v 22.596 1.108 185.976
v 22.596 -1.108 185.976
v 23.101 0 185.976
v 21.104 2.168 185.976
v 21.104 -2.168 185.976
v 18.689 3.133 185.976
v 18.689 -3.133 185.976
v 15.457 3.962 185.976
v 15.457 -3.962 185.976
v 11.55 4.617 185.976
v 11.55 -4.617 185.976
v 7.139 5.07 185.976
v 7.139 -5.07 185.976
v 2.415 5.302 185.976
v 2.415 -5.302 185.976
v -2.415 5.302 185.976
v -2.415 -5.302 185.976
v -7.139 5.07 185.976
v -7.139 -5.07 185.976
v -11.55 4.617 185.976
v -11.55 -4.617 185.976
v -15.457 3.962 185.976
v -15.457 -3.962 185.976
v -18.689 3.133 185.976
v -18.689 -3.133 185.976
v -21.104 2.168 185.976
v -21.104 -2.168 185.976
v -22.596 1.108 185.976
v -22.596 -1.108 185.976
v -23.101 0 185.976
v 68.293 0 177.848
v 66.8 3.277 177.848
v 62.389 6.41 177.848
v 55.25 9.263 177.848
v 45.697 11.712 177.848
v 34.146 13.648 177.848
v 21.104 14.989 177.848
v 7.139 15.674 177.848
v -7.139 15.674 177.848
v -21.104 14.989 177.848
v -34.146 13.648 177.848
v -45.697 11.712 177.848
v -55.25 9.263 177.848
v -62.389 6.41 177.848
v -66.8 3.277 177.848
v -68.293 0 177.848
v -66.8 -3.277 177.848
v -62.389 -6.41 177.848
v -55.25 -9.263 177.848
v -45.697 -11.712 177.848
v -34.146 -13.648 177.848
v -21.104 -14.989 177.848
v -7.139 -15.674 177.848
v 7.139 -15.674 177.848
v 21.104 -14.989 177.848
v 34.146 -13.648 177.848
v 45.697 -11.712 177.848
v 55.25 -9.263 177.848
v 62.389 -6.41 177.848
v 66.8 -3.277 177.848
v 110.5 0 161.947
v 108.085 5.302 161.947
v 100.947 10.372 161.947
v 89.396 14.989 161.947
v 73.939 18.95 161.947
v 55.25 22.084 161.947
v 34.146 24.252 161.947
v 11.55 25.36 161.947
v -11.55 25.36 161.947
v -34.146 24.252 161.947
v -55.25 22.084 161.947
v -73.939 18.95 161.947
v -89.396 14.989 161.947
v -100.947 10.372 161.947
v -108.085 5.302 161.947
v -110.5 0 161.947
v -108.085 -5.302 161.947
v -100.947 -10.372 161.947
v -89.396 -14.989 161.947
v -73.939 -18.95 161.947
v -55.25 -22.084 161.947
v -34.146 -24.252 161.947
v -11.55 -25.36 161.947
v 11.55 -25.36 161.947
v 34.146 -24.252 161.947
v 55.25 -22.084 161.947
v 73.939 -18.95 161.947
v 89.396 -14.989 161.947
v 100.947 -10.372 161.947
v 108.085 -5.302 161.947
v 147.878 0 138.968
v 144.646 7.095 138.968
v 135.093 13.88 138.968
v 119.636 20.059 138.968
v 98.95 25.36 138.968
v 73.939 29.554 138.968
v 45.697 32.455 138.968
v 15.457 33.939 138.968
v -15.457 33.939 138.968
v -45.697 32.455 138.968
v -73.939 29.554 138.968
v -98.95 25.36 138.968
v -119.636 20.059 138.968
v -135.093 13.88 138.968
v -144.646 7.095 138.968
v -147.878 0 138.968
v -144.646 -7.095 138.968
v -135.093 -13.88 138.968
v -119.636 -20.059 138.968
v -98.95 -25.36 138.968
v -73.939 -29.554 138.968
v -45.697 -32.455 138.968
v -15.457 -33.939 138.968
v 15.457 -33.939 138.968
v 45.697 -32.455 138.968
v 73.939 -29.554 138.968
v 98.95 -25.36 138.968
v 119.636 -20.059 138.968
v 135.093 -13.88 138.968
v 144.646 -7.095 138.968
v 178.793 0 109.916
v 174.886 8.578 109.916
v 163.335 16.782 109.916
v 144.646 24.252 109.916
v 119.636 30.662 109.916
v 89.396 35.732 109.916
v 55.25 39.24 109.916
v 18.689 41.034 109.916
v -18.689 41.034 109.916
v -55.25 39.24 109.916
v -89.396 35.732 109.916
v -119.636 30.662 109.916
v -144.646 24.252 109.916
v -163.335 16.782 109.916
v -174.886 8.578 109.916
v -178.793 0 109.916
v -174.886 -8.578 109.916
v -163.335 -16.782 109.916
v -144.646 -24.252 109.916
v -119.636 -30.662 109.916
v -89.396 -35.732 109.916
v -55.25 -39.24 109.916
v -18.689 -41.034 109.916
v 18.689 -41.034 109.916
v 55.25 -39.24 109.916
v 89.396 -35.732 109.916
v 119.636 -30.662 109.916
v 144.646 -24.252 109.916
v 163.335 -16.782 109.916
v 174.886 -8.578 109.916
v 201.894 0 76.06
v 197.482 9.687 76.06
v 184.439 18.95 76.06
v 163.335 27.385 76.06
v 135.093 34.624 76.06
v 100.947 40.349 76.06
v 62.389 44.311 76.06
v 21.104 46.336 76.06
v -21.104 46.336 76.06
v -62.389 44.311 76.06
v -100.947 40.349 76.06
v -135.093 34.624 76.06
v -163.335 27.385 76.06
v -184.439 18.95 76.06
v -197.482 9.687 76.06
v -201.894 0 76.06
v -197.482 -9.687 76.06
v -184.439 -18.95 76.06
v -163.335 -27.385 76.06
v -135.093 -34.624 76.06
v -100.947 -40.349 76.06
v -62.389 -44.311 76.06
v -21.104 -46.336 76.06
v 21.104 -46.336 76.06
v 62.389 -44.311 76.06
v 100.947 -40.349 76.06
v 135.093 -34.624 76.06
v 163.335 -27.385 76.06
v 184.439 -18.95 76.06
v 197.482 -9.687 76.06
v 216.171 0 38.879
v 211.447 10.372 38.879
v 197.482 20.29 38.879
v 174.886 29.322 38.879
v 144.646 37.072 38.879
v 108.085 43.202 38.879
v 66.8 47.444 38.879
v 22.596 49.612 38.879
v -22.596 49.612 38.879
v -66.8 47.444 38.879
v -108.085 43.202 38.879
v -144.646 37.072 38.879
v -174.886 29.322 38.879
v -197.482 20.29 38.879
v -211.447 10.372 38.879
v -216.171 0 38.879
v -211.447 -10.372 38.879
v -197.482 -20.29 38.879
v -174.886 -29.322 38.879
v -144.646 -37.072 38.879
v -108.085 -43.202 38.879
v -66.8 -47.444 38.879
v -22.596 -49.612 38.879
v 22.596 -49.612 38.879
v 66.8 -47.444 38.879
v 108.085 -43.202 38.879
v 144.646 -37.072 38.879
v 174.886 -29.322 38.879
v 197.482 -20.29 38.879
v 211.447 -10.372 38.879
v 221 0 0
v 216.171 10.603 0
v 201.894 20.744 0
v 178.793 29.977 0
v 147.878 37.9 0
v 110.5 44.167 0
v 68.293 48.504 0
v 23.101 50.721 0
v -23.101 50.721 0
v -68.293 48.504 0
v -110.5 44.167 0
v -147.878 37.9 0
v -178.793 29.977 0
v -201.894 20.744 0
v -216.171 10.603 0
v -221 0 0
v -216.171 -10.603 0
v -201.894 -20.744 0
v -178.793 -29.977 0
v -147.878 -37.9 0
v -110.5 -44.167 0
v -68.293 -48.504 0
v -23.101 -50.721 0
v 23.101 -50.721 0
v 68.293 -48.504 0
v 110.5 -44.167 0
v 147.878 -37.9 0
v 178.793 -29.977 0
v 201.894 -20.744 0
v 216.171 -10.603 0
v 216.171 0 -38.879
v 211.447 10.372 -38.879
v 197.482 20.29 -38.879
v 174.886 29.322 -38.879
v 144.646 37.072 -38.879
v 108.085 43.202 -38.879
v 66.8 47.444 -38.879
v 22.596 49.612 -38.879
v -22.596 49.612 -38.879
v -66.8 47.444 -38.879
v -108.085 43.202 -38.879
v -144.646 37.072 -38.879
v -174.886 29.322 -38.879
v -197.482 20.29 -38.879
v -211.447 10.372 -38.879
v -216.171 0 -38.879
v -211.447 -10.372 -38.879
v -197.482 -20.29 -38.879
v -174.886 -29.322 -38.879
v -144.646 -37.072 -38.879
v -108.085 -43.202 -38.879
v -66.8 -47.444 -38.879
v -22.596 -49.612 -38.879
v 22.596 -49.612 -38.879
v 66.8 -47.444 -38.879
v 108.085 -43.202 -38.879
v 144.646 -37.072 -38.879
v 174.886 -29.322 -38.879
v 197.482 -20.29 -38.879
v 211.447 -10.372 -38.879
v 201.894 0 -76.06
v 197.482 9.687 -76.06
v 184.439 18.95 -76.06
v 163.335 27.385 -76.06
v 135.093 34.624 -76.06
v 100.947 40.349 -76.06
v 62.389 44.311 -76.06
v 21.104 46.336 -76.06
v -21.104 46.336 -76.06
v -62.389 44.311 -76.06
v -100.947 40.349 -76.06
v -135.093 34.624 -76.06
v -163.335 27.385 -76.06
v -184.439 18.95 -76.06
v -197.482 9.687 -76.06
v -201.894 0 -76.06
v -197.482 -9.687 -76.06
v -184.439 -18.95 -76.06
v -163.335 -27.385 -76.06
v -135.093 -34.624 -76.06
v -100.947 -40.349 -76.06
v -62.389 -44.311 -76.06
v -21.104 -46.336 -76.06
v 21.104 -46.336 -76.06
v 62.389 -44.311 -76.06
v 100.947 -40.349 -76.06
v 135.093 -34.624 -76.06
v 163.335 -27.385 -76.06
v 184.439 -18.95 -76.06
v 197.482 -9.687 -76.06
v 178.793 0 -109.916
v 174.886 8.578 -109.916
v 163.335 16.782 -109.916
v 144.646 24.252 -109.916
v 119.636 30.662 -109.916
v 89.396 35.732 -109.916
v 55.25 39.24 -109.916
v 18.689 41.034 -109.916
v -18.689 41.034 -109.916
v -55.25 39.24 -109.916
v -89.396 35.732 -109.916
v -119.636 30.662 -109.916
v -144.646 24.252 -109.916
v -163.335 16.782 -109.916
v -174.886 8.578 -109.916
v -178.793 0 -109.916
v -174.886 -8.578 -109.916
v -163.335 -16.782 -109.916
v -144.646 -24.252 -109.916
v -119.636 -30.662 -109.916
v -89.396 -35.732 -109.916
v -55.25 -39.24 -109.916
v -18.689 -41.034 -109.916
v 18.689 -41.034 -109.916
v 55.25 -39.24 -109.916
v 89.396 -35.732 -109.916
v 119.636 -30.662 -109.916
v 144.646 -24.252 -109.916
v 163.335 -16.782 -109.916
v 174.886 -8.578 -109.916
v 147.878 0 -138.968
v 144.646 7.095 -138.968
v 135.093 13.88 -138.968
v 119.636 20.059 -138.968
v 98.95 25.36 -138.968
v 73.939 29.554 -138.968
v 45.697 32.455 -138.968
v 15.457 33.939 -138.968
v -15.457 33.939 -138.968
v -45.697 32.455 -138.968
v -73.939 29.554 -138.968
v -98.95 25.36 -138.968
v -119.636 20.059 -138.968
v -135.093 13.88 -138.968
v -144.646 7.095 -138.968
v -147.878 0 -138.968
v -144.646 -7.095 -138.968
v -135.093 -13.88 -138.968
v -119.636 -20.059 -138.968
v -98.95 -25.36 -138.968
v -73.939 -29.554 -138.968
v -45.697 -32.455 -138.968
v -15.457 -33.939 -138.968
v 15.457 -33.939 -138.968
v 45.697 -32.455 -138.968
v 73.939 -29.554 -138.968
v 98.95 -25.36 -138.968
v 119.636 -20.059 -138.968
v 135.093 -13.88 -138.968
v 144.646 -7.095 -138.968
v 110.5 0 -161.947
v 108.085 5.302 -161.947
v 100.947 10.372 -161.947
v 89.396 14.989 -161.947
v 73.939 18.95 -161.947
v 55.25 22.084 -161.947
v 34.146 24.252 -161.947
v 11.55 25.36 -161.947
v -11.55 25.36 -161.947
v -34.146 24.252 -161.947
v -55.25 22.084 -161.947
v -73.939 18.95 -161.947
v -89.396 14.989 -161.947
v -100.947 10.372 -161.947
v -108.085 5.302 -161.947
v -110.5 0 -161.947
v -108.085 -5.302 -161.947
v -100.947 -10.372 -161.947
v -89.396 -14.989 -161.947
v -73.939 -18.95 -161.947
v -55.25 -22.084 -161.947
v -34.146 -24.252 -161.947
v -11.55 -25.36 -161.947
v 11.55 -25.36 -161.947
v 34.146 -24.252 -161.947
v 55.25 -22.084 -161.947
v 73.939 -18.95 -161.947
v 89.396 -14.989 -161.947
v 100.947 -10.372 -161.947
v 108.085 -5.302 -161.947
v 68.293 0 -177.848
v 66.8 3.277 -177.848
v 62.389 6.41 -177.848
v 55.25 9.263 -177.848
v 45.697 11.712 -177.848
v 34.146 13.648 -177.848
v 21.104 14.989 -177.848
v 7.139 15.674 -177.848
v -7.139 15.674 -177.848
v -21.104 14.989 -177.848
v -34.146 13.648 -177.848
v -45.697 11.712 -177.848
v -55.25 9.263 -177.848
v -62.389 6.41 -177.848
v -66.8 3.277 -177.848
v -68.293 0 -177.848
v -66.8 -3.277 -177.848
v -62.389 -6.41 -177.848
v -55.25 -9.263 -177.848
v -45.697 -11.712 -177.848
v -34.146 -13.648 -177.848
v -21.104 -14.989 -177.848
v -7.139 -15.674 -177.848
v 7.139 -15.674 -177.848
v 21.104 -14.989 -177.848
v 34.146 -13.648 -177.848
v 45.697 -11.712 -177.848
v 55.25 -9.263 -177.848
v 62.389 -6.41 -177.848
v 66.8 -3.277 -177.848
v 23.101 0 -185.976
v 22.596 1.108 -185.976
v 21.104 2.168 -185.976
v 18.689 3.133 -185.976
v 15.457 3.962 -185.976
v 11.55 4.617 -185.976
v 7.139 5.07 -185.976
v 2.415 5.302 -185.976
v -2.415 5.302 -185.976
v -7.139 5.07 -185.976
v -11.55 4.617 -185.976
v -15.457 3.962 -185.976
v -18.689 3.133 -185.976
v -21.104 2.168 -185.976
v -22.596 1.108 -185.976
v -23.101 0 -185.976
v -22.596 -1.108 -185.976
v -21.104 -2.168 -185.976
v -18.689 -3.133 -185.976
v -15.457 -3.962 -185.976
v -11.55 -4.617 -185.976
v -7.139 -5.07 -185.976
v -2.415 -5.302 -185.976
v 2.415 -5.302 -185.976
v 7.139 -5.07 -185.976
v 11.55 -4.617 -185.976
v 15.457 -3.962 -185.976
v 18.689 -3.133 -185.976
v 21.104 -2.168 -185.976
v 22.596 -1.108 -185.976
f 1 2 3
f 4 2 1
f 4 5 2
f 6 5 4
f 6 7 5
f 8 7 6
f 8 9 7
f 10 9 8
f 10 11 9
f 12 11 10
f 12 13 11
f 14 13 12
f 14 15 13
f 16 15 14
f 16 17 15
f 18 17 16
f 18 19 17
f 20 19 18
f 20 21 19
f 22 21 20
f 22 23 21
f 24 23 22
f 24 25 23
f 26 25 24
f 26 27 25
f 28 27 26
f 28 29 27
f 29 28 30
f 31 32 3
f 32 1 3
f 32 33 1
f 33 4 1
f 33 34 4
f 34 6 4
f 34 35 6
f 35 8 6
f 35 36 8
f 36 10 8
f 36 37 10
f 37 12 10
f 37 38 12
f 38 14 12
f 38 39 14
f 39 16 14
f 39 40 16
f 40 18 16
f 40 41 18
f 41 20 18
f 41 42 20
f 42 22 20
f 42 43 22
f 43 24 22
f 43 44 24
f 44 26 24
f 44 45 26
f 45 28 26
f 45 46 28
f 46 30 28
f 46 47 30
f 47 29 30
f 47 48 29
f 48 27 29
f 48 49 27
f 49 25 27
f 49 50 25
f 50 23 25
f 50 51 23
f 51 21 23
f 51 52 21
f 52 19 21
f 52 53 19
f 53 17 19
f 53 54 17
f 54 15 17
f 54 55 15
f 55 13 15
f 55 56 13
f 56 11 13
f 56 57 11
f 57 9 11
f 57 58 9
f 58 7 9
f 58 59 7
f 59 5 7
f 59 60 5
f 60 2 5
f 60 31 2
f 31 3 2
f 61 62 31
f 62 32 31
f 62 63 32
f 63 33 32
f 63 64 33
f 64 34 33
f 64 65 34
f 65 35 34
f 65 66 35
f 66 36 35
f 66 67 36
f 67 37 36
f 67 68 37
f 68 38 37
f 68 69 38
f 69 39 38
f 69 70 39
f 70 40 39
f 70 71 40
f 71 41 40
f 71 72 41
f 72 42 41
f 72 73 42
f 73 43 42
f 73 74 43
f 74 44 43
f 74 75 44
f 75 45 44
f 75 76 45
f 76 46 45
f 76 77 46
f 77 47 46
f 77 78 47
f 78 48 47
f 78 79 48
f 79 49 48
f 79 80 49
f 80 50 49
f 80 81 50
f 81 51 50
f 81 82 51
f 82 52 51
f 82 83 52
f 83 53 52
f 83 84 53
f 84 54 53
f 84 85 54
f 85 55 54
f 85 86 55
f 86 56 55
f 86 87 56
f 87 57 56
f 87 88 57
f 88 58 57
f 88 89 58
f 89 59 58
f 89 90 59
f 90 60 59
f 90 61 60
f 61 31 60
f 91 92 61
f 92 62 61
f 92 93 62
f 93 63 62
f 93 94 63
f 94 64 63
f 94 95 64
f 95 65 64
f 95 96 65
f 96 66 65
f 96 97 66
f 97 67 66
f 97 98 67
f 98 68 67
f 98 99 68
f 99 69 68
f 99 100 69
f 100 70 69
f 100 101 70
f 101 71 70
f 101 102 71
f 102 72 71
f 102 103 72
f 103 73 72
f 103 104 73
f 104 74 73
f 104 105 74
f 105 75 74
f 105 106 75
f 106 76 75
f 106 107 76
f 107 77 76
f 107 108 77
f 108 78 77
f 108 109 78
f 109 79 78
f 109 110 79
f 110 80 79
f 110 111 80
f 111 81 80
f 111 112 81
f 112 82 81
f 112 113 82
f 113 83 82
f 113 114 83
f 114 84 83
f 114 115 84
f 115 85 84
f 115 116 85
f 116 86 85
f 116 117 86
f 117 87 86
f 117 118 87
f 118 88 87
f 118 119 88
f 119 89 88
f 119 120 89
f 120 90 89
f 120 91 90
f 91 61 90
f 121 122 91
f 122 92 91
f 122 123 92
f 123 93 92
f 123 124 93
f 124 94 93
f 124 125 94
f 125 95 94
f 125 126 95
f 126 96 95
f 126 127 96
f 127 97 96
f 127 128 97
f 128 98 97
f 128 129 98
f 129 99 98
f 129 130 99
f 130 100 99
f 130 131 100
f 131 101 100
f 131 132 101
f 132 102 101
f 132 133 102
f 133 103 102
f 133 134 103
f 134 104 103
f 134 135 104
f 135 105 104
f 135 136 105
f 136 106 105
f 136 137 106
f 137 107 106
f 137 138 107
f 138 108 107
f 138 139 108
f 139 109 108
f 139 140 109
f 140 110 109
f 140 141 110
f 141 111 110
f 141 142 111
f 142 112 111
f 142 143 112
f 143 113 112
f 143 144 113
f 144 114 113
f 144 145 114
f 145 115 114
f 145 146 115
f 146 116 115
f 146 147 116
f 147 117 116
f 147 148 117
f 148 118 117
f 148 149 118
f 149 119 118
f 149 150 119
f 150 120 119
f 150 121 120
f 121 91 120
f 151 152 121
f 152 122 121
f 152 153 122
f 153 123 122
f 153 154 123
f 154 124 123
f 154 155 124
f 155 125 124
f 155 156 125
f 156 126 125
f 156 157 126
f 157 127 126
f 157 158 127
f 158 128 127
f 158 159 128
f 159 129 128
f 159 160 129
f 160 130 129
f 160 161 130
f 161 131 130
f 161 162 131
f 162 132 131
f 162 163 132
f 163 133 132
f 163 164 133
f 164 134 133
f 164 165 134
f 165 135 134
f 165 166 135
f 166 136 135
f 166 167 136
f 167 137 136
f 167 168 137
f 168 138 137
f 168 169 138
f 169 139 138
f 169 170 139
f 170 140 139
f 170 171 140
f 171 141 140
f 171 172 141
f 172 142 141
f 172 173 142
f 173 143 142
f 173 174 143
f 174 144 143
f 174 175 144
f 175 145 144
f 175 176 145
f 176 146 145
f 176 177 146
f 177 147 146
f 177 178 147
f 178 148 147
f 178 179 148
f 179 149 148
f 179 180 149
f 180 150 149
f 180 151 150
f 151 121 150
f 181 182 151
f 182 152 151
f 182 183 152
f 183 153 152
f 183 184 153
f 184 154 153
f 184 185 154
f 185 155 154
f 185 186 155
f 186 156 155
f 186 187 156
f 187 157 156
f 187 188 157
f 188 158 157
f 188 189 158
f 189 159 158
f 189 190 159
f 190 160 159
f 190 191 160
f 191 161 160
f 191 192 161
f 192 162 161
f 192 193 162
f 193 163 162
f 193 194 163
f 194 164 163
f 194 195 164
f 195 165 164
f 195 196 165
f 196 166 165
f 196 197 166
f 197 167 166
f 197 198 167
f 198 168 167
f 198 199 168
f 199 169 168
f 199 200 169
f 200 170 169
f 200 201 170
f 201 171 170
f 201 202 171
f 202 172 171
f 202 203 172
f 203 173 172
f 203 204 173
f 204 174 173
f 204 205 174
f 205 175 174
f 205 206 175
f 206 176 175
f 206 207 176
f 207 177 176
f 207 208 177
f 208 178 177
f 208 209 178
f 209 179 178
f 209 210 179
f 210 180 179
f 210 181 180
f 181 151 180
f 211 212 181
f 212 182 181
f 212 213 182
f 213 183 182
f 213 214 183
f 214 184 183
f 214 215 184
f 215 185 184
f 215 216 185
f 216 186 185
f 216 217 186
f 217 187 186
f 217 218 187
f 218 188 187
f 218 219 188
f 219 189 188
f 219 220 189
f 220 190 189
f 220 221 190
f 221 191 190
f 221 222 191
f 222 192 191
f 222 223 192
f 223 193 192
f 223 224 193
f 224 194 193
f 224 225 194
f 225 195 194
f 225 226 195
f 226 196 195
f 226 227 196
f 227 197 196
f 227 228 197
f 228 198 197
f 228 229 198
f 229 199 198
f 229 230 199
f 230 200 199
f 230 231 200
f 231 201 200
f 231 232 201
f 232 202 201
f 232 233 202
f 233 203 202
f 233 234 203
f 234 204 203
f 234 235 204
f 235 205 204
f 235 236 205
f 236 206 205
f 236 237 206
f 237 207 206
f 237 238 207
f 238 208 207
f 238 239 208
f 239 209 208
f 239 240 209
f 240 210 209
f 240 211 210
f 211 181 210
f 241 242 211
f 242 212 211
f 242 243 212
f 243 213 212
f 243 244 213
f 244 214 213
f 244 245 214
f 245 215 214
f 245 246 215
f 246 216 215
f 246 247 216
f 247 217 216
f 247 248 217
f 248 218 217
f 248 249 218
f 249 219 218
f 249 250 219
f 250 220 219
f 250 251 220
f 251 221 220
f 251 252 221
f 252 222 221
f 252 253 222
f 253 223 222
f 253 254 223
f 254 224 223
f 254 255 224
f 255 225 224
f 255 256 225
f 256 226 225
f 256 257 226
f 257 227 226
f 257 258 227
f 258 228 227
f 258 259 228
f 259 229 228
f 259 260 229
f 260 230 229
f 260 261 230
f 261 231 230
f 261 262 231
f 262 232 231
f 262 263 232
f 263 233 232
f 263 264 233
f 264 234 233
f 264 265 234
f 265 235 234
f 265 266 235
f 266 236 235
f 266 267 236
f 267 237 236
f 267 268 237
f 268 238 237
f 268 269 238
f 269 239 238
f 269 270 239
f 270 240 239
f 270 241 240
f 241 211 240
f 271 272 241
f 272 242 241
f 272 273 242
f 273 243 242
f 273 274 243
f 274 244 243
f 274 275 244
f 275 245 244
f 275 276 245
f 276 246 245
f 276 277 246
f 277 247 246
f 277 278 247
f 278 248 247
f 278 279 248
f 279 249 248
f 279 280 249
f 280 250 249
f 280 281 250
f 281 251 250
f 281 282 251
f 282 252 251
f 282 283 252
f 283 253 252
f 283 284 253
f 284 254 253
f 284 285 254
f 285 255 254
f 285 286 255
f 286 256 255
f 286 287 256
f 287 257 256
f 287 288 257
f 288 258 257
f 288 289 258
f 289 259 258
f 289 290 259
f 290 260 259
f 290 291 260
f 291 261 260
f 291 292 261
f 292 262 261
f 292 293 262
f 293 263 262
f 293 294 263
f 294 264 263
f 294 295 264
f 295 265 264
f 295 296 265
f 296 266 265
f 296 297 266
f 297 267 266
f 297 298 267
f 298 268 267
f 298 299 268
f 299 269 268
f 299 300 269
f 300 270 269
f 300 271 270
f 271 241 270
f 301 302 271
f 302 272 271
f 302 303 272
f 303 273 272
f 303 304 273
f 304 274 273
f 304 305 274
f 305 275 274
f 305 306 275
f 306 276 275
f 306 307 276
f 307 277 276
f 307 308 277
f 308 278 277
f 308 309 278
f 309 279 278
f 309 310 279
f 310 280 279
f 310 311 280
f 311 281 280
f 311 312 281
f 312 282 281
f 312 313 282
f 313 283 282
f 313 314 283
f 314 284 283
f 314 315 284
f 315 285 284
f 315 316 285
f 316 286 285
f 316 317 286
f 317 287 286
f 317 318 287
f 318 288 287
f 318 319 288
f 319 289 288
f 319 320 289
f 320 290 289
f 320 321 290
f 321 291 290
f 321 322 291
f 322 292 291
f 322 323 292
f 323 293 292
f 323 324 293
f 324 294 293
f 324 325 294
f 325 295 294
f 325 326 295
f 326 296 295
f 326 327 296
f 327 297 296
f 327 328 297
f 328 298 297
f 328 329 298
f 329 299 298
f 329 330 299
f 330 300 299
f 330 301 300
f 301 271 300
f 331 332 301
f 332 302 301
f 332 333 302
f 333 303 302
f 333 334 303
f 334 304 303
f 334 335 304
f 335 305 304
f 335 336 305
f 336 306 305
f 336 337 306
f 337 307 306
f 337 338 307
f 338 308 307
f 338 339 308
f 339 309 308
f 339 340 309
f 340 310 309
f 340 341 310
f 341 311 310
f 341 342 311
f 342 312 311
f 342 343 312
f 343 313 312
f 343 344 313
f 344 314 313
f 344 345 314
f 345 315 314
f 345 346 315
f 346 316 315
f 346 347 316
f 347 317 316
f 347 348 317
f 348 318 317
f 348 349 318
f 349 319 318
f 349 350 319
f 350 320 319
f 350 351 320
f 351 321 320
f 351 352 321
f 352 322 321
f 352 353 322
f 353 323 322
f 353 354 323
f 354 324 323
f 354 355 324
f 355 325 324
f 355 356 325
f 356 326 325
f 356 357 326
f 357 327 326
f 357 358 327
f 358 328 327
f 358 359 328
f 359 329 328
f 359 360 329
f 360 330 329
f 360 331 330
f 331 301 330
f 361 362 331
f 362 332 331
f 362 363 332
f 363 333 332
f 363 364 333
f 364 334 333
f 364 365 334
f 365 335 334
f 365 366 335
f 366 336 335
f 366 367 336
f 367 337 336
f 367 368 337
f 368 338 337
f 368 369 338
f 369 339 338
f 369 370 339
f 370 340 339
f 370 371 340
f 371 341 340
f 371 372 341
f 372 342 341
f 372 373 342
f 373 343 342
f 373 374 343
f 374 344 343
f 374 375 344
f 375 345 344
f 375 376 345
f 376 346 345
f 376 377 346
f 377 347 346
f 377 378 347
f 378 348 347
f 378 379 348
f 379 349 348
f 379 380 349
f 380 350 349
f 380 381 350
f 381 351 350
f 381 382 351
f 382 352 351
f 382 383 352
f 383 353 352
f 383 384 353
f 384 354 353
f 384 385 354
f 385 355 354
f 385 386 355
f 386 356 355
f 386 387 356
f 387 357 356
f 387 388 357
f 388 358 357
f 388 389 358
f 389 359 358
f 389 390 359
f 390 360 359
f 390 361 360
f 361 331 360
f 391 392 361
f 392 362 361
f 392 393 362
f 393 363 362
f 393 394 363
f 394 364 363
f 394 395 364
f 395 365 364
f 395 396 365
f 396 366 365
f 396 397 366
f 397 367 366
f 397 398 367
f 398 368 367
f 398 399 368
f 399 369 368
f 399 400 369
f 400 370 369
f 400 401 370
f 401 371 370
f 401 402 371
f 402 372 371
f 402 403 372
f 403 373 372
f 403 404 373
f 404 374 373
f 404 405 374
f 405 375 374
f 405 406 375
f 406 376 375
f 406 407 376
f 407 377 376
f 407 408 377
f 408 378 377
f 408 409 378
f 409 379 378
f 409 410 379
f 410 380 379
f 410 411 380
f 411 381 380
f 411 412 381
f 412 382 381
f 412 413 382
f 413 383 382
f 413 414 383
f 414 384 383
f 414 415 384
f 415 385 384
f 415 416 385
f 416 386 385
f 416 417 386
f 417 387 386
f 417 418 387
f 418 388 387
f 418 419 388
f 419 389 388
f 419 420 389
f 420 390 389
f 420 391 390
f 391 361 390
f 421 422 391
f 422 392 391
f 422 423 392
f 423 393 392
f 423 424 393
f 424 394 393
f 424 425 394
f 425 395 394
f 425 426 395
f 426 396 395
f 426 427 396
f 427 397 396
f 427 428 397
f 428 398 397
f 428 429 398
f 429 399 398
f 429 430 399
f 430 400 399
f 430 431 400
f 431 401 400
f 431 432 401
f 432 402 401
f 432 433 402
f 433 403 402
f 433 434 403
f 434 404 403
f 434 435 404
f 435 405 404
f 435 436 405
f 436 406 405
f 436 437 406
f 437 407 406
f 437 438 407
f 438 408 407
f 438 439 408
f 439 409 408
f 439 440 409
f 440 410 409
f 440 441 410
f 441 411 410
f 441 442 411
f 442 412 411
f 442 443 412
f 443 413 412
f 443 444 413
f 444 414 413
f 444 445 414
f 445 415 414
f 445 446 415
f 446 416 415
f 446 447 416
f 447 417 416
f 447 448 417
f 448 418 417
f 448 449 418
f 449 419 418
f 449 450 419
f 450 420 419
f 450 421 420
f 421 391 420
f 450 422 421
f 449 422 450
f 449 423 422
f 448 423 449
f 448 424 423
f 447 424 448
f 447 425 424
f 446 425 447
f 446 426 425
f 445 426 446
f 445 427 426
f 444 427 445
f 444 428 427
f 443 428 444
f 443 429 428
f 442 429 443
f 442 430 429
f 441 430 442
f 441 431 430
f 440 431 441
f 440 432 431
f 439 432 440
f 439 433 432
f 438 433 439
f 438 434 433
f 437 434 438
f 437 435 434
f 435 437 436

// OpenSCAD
// Generated by SolidPython 1.0.1 on 2020-07-29 00:46:50


scale(v = [13, 3, 11]) {
	sphere(r = 17);
}
/***********************************************
*********      SolidPython code:      **********
************************************************
 
# import packages: SolidPython
from solid import *
from solid.utils import *
from itertools import chain, combinations, permutations


class Resize:

    def __init__(self, scad_file):
        self.scad_file = scad_file
        #self.scad_file = import_scad(scad_file)
        # cone/cylinder param:
        self.r1 = 0
        self.r2 = 0
        self.h = 0
        # rectangular prism param:
        self.w = 0
        self.l = 0
        # ellipse param:
        self.r = 0

    # import OpenScad code (file name corresponds to shape)


    # classify shape + parameters
    def assign(self, param1, param2, param3):
        if self.scad_file == 'cone.scad':
            self.r1 = param1
            self.r2 = param2
            self.h = param3
        elif self.scad_file == 'cylinder.scad':
            self.r1 = param1
            self.r2 = param2
            self.h = param3
        elif self.scad_file == 'rectangularPrism.scad':
            self.h = param1
            self.l = param2
            self.w = param3
        else:
            self.r = param1
            self.h = param2

    # resize parameters
    def iterate(self):
        x = range(3, 20, 2)
        i = 1
        if self.scad_file == 'cone.scad':
            tempList = list(permutations(x, 2))
            for temp in tempList:
                param1 = temp[0]
                param2 = temp[1]
                filepath = 'produced_scad_files/' + 'cone' + str(param1) + '_' + str(param2) + '_' + '.scad'
                scad_render_to_file(cylinder(h=param1, r1=param2, r2=0), filepath)

        elif self.scad_file == 'cylinder.scad':
            tempList = list(permutations(x, 3))
            for temp in tempList:
                param1 = temp[0]
                param2 = temp[1]
                filepath = 'produced_scad_files/' + 'cylinder' + str(param1) + '_' + str(param2) + '_' + '.scad'
                scad_render_to_file(cylinder(h=param1, r1=param2, r2=param2), filepath)

        elif self.scad_file == 'rectangularPrism.scad':
            tempList = list(permutations(x, 3))
            for temp in tempList:
                param1 = temp[0]
                param2 = temp[1]
                param3 = temp[2]
                filepath = 'produced_scad_files/' + 'rectangularPrism' + str(param1) + '_' + str(param2) + '_' + str(
                    param3) + '.scad'
                scad_render_to_file(cube(size=(param1, param2, param3)), filepath)

        elif self.scad_file == 'ellipse.scad':
            tempList = list(permutations(x, 4))
            for temp in tempList:
                param1 = temp[0]
                param2 = temp[1]
                param3 = temp[2]
                param4 = temp[3]
                filepath = 'produced_scad_files/' + 'ellipse' + str(param1) + '_' + str(param2) + '_' + str(param3) + '_' + str(param4) + '.scad'
                scad_render_to_file(scale([param1, param2, param3])(sphere(r=param4)), filepath)

    def render_to_scadfile(self):
        scad_render_to_file(scad, 'example.scad') 
 
************************************************/
